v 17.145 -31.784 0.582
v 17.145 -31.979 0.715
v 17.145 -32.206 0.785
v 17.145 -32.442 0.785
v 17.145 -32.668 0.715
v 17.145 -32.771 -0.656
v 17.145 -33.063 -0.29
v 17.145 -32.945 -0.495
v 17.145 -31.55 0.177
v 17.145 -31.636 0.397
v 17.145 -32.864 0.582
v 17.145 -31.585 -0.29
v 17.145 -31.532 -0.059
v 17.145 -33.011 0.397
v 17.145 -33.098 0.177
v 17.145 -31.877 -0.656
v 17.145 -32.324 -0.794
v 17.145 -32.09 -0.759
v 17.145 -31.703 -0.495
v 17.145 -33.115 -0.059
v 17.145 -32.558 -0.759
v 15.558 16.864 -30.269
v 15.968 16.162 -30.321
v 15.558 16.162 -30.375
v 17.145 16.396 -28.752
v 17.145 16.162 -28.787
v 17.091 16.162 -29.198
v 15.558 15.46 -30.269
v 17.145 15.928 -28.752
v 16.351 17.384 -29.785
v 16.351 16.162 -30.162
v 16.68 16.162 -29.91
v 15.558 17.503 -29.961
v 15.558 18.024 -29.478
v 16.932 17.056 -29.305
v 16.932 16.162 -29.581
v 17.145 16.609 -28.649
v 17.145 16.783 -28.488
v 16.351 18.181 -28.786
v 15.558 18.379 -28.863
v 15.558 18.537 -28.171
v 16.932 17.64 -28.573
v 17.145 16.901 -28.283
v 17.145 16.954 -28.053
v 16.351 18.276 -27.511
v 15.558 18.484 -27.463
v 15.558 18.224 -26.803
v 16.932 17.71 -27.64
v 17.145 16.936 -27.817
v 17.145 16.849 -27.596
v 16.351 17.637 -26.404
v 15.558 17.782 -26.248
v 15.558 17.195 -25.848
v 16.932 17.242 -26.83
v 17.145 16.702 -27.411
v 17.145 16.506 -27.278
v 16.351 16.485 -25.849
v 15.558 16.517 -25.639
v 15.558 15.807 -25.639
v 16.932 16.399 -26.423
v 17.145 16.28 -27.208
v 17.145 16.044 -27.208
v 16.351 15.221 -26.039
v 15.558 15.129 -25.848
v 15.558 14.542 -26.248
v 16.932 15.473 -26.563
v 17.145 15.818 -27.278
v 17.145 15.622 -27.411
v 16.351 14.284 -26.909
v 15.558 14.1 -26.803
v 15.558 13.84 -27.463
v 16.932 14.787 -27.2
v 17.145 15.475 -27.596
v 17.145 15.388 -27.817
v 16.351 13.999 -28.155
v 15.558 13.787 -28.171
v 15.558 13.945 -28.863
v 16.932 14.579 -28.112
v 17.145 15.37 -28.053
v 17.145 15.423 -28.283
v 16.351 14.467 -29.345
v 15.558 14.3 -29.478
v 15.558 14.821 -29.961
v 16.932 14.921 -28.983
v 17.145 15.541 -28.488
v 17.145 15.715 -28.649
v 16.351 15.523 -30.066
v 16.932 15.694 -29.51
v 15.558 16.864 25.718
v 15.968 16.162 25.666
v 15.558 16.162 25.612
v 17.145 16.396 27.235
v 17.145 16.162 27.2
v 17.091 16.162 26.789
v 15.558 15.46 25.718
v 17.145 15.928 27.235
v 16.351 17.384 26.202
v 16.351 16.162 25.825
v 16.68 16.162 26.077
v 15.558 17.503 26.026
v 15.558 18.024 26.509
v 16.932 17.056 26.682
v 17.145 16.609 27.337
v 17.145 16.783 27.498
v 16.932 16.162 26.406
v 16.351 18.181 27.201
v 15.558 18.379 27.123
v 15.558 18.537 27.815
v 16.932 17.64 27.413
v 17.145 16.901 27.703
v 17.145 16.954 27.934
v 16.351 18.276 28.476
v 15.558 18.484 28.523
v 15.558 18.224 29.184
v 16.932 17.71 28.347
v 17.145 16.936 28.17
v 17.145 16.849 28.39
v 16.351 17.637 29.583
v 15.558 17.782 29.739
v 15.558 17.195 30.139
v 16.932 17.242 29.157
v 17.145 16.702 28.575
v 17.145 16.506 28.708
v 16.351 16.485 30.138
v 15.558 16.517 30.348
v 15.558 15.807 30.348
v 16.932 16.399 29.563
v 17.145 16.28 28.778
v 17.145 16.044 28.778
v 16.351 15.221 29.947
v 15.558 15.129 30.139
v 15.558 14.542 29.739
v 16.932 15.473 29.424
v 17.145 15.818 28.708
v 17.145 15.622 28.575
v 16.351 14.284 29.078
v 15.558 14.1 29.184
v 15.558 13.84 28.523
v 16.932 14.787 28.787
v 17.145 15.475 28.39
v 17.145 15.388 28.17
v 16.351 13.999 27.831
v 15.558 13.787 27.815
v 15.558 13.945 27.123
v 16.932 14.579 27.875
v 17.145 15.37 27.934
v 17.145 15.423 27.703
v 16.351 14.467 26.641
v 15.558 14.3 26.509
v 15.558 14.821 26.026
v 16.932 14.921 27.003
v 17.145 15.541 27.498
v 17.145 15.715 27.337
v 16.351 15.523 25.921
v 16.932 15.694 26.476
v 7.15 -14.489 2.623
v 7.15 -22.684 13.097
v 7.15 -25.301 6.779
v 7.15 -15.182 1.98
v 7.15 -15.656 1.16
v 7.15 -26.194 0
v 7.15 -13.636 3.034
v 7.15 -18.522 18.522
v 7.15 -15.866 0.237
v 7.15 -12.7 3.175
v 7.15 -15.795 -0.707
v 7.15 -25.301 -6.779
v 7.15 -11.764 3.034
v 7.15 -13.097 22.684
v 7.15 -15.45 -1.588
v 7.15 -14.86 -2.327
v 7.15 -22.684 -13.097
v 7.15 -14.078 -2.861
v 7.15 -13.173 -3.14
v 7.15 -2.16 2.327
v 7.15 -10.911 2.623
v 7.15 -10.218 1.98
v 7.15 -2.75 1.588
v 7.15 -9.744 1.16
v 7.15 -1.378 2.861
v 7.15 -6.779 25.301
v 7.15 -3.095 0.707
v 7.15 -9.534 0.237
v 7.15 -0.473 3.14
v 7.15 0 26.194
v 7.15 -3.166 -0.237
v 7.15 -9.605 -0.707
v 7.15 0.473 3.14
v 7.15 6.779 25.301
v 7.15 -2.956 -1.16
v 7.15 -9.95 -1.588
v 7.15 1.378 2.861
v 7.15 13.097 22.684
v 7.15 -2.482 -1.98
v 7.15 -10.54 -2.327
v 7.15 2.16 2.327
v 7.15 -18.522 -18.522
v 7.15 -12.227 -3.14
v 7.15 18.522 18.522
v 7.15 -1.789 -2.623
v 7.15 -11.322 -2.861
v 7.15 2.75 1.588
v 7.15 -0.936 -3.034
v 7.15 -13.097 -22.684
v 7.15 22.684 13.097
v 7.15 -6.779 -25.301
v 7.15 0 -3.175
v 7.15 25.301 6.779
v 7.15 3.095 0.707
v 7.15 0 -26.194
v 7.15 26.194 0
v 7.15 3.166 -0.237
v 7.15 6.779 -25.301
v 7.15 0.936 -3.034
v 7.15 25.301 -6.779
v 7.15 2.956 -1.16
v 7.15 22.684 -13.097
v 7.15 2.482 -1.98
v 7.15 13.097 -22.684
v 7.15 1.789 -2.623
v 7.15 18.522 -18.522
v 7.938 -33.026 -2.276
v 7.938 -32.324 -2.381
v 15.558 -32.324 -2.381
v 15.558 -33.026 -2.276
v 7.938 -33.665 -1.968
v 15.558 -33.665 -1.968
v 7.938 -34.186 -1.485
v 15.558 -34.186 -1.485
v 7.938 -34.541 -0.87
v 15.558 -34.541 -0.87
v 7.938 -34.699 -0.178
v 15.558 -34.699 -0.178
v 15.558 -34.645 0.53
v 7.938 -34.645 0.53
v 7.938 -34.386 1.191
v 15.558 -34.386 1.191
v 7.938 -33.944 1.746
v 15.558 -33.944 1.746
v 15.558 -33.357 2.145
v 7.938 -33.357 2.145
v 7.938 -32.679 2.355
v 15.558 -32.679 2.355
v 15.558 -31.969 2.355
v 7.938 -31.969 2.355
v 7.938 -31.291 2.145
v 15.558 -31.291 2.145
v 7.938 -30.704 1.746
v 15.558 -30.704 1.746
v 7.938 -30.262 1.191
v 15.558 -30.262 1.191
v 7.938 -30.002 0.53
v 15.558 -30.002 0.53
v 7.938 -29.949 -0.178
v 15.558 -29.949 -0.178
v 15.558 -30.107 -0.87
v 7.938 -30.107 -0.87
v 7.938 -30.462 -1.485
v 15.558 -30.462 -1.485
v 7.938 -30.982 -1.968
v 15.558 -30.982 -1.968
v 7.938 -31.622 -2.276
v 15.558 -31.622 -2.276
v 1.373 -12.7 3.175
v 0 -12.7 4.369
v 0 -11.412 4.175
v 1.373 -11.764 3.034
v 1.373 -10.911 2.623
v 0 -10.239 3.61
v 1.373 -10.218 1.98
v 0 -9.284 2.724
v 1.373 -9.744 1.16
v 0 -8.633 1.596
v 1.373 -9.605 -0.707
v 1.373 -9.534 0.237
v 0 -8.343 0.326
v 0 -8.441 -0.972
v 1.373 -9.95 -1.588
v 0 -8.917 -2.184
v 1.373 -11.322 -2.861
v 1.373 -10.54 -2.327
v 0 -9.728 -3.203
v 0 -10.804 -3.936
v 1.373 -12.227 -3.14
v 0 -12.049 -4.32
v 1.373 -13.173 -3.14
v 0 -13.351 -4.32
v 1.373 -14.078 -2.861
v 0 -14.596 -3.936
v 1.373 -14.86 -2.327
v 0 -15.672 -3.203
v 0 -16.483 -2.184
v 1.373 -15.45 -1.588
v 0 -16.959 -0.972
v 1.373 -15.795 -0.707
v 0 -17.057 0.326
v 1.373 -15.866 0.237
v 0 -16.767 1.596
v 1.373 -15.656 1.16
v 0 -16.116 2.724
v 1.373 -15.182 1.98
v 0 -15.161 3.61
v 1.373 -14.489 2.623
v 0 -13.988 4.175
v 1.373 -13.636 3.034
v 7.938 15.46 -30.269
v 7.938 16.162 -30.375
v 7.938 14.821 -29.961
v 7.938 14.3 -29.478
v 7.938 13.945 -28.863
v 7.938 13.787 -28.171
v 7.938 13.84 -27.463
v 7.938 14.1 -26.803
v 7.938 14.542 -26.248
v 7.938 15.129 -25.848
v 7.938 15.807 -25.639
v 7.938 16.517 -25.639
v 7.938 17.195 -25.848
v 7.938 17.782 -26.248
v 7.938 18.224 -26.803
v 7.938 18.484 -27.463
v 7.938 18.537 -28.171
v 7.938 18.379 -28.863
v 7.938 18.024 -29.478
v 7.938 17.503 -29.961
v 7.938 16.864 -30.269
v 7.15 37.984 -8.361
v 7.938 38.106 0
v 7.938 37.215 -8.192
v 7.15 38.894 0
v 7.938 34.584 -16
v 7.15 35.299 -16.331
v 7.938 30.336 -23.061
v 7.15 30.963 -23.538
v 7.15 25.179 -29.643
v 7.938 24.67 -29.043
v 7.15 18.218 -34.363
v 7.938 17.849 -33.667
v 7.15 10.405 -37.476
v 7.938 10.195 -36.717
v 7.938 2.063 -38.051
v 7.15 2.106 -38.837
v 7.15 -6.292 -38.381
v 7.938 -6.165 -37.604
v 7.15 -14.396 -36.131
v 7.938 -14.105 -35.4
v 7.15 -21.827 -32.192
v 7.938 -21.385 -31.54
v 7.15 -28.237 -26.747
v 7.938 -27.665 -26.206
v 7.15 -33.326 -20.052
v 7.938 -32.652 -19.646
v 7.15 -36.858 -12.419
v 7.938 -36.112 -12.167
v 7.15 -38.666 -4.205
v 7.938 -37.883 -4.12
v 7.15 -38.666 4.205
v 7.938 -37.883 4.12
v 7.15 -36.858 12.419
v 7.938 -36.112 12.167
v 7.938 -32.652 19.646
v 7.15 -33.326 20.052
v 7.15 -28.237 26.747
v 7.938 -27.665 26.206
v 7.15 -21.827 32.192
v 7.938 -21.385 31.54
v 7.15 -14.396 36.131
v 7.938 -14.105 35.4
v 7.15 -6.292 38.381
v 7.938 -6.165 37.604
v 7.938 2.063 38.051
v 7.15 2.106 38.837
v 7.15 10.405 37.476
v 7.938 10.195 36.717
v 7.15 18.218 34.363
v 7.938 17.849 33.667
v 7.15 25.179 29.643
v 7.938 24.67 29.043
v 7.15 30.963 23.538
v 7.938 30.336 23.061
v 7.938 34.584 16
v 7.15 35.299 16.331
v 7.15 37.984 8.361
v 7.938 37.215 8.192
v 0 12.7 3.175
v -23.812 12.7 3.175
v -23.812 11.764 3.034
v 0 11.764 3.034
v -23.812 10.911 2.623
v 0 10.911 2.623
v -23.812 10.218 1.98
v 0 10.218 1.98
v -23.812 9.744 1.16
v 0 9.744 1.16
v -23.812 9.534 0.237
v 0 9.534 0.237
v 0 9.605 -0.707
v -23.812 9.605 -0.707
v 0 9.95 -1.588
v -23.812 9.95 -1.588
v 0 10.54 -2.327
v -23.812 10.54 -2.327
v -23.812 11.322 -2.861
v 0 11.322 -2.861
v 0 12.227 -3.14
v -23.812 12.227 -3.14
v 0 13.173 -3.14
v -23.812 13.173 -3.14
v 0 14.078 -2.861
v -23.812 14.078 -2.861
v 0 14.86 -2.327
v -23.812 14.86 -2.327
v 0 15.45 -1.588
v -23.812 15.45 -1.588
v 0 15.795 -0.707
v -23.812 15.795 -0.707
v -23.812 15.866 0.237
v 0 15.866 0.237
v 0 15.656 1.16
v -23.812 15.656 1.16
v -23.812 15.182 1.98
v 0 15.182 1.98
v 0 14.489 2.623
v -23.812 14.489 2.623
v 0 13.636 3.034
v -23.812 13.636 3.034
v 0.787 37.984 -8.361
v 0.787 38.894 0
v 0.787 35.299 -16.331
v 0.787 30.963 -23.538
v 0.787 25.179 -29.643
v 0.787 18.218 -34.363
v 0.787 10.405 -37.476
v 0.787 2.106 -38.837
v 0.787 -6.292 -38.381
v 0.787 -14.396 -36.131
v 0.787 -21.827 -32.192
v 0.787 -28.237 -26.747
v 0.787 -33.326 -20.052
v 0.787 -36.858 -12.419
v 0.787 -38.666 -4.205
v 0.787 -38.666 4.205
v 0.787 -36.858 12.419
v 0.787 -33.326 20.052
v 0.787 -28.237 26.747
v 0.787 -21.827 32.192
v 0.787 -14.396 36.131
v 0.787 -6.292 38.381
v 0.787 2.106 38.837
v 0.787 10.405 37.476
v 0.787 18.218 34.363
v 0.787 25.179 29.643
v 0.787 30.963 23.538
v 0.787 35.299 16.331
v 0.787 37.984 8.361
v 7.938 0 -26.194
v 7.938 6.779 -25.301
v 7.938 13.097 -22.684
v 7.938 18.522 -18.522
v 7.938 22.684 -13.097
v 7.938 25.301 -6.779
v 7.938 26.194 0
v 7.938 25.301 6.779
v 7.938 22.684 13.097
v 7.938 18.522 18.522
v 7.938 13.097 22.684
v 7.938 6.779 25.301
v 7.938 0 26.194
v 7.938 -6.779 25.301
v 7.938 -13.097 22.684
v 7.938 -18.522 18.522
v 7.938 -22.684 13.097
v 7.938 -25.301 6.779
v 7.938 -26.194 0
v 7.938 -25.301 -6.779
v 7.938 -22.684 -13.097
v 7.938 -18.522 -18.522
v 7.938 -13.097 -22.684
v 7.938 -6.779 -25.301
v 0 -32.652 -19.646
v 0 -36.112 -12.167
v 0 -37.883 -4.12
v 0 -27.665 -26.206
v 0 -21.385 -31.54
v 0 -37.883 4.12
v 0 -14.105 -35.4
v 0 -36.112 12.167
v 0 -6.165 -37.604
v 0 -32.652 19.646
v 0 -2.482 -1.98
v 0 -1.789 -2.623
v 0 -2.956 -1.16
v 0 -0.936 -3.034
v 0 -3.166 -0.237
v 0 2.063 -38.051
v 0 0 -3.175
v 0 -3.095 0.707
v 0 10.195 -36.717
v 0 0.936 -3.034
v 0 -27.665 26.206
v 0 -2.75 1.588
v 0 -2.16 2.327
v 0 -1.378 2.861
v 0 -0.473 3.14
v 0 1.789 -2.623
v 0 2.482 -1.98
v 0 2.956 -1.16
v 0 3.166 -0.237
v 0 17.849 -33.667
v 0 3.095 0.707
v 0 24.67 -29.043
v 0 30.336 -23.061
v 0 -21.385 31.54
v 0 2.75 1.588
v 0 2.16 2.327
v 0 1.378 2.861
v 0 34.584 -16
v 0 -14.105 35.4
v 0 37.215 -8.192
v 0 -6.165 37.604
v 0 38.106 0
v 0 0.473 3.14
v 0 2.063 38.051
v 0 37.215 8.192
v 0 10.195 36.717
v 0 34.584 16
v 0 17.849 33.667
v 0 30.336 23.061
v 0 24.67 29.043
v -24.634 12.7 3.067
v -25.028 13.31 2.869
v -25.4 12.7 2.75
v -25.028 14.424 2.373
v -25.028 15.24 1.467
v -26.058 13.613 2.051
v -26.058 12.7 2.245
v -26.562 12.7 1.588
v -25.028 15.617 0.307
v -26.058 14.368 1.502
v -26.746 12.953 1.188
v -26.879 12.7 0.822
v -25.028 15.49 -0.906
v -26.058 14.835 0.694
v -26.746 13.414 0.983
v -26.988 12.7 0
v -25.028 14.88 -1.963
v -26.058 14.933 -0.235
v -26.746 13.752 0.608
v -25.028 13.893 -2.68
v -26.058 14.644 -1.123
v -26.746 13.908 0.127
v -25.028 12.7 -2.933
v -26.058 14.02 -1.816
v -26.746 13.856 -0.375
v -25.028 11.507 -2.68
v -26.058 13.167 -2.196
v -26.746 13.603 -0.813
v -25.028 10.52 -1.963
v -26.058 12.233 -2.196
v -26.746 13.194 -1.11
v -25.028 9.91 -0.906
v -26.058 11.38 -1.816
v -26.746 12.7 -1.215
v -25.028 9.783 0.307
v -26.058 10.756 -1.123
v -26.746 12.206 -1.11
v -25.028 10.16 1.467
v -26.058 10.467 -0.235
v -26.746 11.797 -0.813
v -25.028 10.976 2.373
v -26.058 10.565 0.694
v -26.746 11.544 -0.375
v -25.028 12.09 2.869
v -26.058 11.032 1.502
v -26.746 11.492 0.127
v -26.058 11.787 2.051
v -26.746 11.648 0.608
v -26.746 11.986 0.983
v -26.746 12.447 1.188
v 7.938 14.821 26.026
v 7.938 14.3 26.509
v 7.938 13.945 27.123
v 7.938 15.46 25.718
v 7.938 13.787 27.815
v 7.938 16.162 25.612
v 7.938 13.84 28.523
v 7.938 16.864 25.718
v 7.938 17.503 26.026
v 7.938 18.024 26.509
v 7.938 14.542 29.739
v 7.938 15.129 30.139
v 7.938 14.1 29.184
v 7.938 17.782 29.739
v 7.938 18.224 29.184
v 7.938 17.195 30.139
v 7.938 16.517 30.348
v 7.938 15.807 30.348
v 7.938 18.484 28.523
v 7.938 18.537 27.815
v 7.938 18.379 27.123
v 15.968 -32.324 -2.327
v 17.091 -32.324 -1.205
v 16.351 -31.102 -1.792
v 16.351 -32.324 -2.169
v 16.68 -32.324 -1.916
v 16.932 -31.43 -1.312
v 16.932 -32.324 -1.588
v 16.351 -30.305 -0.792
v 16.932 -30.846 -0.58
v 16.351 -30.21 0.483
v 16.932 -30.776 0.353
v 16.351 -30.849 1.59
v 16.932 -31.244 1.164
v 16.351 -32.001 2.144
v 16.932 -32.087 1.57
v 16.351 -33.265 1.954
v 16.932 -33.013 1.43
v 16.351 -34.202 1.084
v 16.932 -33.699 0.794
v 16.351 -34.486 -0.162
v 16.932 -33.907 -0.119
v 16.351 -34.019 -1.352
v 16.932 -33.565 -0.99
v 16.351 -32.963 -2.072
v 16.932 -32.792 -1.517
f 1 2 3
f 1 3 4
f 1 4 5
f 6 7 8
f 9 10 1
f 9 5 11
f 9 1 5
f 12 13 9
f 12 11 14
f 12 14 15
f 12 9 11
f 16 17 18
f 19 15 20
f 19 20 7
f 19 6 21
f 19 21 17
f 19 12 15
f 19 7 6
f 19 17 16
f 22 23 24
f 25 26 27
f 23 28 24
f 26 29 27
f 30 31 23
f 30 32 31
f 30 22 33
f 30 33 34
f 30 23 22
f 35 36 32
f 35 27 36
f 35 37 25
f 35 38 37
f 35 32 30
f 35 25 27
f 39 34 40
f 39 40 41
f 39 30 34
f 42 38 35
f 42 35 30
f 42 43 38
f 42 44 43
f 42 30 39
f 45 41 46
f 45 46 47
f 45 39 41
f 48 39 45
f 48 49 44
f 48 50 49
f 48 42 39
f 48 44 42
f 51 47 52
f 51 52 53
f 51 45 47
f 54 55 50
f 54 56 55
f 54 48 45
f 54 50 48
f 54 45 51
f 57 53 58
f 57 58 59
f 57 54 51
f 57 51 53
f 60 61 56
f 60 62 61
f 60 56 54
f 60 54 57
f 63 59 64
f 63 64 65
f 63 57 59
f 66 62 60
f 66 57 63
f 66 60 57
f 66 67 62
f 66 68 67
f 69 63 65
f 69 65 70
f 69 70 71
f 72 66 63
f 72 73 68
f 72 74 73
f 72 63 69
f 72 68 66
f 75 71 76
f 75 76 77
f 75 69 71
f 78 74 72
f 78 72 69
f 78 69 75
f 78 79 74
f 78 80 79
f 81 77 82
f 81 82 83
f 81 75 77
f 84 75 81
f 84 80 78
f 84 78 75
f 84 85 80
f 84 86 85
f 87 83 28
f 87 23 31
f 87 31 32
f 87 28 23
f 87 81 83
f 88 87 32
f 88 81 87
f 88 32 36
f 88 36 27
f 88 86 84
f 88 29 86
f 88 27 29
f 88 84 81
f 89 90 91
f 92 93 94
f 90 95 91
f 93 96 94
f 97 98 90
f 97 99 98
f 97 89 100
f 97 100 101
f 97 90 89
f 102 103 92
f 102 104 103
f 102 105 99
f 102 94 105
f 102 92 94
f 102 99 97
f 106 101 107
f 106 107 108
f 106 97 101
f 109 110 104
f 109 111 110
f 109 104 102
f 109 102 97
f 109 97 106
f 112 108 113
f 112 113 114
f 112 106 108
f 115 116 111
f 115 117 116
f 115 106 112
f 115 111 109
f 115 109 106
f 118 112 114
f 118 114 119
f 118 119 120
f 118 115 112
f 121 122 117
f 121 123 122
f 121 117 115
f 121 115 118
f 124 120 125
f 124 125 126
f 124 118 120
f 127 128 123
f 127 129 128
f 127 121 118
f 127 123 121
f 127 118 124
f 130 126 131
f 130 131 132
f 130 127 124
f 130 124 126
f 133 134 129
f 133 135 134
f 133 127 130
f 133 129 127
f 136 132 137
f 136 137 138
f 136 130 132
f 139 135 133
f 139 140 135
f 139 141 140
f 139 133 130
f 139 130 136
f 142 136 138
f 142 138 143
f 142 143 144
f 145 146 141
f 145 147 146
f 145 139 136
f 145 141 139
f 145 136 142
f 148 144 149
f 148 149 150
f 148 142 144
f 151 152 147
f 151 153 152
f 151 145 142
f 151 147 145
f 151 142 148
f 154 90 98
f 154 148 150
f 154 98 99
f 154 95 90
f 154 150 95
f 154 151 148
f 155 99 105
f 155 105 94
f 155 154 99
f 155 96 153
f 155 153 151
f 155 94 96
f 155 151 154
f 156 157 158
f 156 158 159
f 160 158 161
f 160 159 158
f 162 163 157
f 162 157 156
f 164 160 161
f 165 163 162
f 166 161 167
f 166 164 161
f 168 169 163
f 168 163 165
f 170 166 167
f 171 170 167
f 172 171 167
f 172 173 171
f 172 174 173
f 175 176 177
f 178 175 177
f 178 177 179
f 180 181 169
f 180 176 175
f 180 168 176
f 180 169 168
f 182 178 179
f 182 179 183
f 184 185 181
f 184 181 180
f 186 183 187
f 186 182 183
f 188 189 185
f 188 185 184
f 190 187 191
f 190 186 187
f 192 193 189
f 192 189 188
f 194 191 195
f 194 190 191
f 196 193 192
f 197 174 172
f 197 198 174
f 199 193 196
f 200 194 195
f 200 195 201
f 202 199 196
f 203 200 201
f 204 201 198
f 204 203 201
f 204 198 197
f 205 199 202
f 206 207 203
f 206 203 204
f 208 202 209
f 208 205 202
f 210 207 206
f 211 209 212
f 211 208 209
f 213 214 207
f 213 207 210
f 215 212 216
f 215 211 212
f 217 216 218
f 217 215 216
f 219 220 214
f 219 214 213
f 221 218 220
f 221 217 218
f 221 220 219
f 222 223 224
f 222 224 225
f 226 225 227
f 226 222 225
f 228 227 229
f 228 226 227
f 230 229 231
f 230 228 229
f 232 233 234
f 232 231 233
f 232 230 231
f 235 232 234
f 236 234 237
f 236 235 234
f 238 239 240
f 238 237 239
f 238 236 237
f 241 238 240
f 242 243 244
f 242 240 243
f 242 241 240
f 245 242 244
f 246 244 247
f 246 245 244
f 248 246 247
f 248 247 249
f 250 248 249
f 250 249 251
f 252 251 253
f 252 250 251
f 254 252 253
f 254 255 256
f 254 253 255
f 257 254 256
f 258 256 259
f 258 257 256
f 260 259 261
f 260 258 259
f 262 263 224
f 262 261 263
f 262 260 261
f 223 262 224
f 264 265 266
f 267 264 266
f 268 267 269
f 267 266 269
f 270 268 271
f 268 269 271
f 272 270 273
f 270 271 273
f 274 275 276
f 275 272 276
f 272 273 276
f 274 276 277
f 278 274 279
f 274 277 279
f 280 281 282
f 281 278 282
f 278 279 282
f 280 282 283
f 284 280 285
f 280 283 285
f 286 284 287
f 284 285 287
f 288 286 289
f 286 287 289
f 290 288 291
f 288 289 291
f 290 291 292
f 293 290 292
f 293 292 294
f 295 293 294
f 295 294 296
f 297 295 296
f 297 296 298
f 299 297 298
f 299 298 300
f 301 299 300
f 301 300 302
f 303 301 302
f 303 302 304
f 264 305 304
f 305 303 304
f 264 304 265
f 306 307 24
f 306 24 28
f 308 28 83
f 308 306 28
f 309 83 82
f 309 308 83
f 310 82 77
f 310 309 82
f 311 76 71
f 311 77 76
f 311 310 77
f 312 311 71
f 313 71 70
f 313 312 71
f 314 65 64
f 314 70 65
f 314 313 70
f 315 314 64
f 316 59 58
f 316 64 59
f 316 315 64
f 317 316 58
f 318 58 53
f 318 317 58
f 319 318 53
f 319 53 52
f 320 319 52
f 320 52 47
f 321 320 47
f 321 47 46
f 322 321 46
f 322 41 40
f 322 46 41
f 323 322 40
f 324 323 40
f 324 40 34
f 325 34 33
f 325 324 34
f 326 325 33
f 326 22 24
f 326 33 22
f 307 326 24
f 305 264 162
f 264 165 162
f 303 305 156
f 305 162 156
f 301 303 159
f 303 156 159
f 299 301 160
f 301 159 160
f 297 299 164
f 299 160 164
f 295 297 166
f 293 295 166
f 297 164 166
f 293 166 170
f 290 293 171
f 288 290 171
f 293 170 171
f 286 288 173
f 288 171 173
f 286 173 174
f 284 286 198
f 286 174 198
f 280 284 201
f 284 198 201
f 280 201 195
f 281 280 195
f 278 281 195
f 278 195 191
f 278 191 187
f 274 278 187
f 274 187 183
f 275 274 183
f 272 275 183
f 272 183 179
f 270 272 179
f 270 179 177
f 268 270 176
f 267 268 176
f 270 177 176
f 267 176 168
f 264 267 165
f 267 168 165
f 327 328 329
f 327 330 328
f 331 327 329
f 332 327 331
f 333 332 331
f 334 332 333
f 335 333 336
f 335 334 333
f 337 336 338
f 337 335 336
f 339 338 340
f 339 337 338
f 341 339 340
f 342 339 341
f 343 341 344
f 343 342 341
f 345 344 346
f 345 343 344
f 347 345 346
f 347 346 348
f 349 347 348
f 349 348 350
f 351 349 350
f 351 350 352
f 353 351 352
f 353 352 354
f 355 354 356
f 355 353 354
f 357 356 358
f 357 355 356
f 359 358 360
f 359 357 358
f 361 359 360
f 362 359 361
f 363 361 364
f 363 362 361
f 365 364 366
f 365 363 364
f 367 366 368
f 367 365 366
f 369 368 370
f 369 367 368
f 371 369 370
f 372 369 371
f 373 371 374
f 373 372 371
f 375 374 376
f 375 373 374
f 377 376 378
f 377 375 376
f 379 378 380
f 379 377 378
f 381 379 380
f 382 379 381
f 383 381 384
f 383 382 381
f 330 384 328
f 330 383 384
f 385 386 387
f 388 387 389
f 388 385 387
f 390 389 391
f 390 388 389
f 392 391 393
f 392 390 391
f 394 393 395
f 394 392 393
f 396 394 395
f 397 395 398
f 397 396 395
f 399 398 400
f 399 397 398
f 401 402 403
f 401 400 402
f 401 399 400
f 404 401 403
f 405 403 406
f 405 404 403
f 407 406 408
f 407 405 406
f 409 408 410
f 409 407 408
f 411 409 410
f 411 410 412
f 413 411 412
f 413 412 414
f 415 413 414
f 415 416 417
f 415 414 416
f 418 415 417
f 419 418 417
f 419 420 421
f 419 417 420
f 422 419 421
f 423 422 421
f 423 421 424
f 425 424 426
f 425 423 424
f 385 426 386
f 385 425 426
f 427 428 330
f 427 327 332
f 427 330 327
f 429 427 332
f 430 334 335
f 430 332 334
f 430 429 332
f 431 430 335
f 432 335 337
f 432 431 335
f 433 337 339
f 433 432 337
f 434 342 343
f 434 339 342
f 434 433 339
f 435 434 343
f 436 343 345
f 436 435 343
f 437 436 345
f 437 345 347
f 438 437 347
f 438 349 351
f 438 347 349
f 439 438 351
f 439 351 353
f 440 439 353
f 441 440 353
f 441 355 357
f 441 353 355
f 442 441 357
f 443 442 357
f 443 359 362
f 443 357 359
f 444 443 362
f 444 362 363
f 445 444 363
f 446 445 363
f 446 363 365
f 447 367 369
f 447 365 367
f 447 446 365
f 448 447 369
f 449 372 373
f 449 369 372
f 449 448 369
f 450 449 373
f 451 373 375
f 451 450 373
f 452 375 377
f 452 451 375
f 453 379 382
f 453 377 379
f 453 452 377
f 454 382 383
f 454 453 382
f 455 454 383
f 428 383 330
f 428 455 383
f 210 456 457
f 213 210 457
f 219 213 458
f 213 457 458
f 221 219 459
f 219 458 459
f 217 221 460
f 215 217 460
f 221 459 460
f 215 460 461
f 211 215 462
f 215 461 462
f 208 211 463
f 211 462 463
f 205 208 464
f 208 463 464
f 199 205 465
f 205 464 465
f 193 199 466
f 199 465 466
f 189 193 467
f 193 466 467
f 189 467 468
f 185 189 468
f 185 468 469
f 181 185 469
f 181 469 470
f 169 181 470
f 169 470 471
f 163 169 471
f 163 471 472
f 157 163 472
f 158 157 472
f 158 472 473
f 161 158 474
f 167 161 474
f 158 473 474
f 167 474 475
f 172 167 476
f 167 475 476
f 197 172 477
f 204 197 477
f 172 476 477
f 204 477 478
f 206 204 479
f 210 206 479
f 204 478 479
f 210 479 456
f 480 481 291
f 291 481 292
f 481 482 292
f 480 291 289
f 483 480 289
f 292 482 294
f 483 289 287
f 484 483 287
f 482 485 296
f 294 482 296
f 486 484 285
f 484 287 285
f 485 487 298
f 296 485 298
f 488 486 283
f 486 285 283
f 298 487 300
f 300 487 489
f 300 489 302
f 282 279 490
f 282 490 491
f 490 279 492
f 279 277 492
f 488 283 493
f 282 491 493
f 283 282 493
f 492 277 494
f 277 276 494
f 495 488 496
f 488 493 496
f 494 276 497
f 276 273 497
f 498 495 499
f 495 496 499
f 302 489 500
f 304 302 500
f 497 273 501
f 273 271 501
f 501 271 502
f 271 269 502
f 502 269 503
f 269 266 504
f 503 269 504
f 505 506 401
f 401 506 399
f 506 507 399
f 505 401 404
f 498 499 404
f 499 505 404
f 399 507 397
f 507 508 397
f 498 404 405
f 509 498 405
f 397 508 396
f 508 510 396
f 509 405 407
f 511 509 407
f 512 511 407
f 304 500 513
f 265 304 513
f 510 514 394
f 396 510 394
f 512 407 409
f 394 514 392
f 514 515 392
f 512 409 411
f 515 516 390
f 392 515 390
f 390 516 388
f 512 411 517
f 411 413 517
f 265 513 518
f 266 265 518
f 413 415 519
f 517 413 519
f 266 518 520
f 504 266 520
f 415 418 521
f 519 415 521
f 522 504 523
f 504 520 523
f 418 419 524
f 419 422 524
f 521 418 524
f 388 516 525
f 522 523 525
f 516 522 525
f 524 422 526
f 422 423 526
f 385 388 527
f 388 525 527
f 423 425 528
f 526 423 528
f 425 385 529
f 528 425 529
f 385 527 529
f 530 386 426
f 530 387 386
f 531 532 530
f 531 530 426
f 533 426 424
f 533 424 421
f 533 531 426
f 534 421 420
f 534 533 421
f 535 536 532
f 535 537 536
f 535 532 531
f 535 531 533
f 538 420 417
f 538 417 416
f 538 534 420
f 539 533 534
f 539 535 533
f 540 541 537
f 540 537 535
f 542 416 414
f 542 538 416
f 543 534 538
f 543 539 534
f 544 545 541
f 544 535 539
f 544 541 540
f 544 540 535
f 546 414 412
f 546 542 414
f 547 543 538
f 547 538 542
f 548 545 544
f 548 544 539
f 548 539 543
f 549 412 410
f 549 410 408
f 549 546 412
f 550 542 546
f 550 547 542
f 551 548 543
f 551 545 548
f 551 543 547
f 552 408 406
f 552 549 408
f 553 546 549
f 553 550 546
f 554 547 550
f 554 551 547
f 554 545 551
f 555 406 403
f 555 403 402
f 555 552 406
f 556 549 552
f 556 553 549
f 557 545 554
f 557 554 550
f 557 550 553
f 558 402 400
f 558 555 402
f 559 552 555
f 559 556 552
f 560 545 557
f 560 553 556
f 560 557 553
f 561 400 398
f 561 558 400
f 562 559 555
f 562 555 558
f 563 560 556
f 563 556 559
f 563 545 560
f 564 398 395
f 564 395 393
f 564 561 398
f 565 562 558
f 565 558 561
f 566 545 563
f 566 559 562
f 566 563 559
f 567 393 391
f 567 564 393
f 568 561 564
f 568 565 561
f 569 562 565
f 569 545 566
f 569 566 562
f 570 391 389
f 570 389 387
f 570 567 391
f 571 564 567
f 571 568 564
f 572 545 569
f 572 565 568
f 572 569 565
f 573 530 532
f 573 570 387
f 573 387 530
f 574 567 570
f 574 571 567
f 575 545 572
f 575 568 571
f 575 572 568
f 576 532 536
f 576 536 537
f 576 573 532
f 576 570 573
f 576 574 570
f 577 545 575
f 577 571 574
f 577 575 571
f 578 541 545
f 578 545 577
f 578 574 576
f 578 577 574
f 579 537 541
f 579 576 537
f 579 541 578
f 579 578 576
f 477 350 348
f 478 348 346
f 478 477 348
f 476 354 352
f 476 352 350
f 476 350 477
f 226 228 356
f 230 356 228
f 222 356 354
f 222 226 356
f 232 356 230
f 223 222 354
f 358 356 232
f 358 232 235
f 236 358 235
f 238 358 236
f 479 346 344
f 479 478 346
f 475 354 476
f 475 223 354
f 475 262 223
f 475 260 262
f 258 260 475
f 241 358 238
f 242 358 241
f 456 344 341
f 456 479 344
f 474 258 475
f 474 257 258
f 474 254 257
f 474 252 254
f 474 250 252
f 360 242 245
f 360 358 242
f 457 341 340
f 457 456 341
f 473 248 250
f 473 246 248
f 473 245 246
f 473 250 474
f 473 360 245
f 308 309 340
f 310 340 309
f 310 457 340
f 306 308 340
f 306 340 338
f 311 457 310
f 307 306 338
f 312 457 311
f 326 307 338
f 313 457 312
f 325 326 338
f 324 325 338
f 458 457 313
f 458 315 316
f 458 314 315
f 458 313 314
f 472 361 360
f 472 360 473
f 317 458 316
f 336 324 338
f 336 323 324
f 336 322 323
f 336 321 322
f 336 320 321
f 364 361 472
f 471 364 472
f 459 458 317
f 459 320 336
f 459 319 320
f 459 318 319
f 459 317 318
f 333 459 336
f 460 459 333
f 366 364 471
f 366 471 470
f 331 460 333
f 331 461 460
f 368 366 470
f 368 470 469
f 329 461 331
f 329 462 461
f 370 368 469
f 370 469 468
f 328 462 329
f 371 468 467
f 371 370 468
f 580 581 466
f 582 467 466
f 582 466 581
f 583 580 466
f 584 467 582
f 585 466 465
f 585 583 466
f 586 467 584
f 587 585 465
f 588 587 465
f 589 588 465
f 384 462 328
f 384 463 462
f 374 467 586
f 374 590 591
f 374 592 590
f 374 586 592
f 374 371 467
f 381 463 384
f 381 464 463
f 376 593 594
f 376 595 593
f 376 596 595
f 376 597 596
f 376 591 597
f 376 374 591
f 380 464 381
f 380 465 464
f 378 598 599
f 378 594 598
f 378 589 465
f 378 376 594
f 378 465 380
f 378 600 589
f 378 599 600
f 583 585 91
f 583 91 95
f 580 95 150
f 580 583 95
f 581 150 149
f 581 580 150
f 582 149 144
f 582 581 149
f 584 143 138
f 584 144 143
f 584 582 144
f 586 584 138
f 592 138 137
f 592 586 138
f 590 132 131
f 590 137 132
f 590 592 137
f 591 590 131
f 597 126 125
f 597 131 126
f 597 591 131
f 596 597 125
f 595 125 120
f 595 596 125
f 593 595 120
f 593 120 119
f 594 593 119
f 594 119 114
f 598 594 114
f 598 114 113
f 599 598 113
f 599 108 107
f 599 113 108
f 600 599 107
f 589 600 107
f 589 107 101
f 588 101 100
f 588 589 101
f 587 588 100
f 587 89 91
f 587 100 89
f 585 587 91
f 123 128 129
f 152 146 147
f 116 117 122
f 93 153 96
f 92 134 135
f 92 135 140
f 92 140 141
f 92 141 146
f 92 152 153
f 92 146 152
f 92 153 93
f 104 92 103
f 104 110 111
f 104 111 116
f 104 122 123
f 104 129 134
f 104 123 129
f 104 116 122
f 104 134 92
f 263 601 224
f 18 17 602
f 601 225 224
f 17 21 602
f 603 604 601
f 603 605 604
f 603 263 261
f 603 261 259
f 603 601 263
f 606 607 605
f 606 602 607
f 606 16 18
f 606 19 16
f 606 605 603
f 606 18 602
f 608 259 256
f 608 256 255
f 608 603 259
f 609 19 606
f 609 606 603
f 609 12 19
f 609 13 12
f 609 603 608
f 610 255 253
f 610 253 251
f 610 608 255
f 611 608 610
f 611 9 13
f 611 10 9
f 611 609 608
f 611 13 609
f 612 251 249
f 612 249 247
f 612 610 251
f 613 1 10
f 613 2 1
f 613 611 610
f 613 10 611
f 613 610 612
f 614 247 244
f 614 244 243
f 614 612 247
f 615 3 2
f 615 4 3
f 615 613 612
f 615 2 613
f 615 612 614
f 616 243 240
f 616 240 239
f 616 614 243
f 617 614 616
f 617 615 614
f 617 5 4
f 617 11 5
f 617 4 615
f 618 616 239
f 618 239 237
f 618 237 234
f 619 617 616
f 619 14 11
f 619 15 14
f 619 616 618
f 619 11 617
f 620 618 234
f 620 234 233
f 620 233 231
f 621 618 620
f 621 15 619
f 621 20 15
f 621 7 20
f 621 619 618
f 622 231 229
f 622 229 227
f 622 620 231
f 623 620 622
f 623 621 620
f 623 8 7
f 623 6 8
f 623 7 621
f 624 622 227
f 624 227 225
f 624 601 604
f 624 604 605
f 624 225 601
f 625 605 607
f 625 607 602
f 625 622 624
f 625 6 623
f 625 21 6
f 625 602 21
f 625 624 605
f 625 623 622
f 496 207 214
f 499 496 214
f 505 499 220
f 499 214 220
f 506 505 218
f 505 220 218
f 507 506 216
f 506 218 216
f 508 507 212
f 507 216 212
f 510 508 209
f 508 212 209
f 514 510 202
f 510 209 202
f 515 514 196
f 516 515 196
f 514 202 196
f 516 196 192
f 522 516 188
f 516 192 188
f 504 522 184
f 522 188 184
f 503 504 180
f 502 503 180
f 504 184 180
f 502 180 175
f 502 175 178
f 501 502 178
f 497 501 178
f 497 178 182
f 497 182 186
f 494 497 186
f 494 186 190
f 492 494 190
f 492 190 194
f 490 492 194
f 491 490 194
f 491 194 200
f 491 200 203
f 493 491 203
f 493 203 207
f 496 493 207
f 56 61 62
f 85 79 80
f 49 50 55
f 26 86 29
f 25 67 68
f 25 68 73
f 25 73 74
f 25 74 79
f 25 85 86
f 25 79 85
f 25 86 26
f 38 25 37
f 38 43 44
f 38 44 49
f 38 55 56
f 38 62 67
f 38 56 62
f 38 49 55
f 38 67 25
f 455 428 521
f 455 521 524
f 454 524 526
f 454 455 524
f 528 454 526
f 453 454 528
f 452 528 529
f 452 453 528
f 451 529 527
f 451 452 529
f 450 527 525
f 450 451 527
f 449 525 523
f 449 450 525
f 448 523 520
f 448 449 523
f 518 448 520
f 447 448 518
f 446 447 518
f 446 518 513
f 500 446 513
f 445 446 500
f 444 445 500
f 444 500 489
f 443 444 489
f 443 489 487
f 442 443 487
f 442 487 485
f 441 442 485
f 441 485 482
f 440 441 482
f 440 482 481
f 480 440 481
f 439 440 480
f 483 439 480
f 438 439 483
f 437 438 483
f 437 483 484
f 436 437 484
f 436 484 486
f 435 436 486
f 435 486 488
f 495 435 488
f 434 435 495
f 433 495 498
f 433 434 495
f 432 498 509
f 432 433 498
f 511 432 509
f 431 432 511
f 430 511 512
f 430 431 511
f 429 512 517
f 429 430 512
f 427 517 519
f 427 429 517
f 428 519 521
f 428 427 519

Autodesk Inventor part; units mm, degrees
ref_plane "YZ Plane" through (0, 0, 0) normal (1, 0, 0) x (0, 1, 0)
ref_plane "XZ Plane" through (0, 0, 0) normal (0, 1, 0) x (-1, 0, 0)
ref_plane "XY Plane" through (0, 0, 0) normal (0, 0, 1) x (1, 0, 0)
sketch "Sketch1" plane through (0, 0, 0) normal (1, 0, 0) x (0, 1, 0)
  circle A0 centre (0, 0) radius 38.8938
  dimension "d0" = 77.7875
extrude "Extrusion1" add sketch "Sketch1" along normal blind 7.9375
chamfer "Chamfer1" distance 0.7874 angle 45 2 edges at (7.9375, -38.8938, 0) (0, -38.8938, 0)
sketch "Sketch2" plane through (7.9375, 0, 0) normal (1, 0, 0) x (0, 0, -1)
  circle A0 centre (0, 0) radius 3.175
  dimension "d6" = 6.35
extrude "Extrusion2" cut sketch "Sketch2" against normal blind 7.9375
sketch "Sketch3" plane through (0, 0, 0) normal (-1, 0, 0) x (0, 0, 1)
  line L0 (0, 0) -> (0, -12.7)
  dimension "d9" = 12.7
hole "Hole1" at (0, -12.7, 0) direction (1, 0, 0) diameter 6.35 end through all countersink diameter 8.7376 countersink angle 82
sketch "Sketch4" plane through (0, 0, 0) normal (-1, 0, 0) x (0, 0, 1)
  point P0 (0, 0)
sketch "Sketch5" plane through (7.9375, 0, 0) normal (1, 0, 0) x (0, 0, -1)
  circle A0 centre (0, 0) radius 26.1938
  dimension "d17" = 52.3875
extrude "Extrusion3" cut sketch "Sketch5" against normal blind 0.7874
sketch "Sketch6" plane through (0, 0, 0) normal (-1, 0, 0) x (0, 0, 1)
  line L0 (0, 0) -> (0, 12.7)
  circle A0 centre (0, 12.7) radius 3.175
  dimension "d20" = 12.7
  dimension "d21" = 6.35
extrude "Extrusion4" add sketch "Sketch6" along normal blind 22.225
sketch "Sketch7" plane through (-22.225, 12.7, 0) normal (-1, 0, 0) x (0, 0, 1)
  circle A0 centre (0, 0) radius 3.175 projected
  circle A1 centre (0, 0) radius 3.175
  point P0 (0, -12.7)
extrude "Extrusion5" add sketch "Sketch7" along normal blind 4.7625
fillet "Fillet1" radius 3.175 1 edges at (-26.9875, 12.7, -3.175)
sketch "Sketch8" plane through (7.9375, 0, 0) normal (1, 0, 0) x (0, 0, -1)
  circle A0 centre (0, -32.3239) radius 2.3813
  circle A1 centre (27.9933, 16.162) radius 2.3813
  circle A2 centre (-27.9933, 16.162) radius 2.3813
  point P0 (0, 0)
  dimension "d27" = 4.7625
  dimension "d30" = 360
extrude "Extrusion6" add sketch "Sketch8" along normal blind 4.7625
sketch "Sketch9" plane through (12.7, 16.162, -27.9933) normal (1, 0, 0) x (0, 0, -1)
  circle A0 centre (0, 0) radius 2.3813
  point P0 (-27.9933, -16.162)
extrude "Extrusion7" add sketch "Sketch9" along normal blind 4.445
fillet "Fillet2" radius 1.5875 1 edges at (17.145, 16.162, -25.6121)
sketch "Sketch10" plane through (12.7, 16.162, 27.9933) normal (1, 0, 0) x (0, 0, -1)
  circle A0 centre (0, 0) radius 2.3813 projected
  circle A1 centre (0, 0) radius 2.3813
  point P0 (27.9933, -16.162)
extrude "Extrusion8" add sketch "Sketch10" along normal blind 4.445
fillet "Fillet3" radius 1.5875 1 edges at (17.145, 16.162, 30.3746)
sketch "Sketch11" plane through (12.7, -32.3239, 0) normal (1, 0, 0) x (0, 0, -1)
  circle A0 centre (0, 0) radius 2.3813 projected
  circle A1 centre (0, 0) radius 2.3813
  point P0 (0, 32.3239)
extrude "Extrusion9" add sketch "Sketch11" along normal blind 4.445
fillet "Fillet4" radius 1.5875 1 edges at (17.145, -32.3239, 2.3813)
properties part number "idk"
